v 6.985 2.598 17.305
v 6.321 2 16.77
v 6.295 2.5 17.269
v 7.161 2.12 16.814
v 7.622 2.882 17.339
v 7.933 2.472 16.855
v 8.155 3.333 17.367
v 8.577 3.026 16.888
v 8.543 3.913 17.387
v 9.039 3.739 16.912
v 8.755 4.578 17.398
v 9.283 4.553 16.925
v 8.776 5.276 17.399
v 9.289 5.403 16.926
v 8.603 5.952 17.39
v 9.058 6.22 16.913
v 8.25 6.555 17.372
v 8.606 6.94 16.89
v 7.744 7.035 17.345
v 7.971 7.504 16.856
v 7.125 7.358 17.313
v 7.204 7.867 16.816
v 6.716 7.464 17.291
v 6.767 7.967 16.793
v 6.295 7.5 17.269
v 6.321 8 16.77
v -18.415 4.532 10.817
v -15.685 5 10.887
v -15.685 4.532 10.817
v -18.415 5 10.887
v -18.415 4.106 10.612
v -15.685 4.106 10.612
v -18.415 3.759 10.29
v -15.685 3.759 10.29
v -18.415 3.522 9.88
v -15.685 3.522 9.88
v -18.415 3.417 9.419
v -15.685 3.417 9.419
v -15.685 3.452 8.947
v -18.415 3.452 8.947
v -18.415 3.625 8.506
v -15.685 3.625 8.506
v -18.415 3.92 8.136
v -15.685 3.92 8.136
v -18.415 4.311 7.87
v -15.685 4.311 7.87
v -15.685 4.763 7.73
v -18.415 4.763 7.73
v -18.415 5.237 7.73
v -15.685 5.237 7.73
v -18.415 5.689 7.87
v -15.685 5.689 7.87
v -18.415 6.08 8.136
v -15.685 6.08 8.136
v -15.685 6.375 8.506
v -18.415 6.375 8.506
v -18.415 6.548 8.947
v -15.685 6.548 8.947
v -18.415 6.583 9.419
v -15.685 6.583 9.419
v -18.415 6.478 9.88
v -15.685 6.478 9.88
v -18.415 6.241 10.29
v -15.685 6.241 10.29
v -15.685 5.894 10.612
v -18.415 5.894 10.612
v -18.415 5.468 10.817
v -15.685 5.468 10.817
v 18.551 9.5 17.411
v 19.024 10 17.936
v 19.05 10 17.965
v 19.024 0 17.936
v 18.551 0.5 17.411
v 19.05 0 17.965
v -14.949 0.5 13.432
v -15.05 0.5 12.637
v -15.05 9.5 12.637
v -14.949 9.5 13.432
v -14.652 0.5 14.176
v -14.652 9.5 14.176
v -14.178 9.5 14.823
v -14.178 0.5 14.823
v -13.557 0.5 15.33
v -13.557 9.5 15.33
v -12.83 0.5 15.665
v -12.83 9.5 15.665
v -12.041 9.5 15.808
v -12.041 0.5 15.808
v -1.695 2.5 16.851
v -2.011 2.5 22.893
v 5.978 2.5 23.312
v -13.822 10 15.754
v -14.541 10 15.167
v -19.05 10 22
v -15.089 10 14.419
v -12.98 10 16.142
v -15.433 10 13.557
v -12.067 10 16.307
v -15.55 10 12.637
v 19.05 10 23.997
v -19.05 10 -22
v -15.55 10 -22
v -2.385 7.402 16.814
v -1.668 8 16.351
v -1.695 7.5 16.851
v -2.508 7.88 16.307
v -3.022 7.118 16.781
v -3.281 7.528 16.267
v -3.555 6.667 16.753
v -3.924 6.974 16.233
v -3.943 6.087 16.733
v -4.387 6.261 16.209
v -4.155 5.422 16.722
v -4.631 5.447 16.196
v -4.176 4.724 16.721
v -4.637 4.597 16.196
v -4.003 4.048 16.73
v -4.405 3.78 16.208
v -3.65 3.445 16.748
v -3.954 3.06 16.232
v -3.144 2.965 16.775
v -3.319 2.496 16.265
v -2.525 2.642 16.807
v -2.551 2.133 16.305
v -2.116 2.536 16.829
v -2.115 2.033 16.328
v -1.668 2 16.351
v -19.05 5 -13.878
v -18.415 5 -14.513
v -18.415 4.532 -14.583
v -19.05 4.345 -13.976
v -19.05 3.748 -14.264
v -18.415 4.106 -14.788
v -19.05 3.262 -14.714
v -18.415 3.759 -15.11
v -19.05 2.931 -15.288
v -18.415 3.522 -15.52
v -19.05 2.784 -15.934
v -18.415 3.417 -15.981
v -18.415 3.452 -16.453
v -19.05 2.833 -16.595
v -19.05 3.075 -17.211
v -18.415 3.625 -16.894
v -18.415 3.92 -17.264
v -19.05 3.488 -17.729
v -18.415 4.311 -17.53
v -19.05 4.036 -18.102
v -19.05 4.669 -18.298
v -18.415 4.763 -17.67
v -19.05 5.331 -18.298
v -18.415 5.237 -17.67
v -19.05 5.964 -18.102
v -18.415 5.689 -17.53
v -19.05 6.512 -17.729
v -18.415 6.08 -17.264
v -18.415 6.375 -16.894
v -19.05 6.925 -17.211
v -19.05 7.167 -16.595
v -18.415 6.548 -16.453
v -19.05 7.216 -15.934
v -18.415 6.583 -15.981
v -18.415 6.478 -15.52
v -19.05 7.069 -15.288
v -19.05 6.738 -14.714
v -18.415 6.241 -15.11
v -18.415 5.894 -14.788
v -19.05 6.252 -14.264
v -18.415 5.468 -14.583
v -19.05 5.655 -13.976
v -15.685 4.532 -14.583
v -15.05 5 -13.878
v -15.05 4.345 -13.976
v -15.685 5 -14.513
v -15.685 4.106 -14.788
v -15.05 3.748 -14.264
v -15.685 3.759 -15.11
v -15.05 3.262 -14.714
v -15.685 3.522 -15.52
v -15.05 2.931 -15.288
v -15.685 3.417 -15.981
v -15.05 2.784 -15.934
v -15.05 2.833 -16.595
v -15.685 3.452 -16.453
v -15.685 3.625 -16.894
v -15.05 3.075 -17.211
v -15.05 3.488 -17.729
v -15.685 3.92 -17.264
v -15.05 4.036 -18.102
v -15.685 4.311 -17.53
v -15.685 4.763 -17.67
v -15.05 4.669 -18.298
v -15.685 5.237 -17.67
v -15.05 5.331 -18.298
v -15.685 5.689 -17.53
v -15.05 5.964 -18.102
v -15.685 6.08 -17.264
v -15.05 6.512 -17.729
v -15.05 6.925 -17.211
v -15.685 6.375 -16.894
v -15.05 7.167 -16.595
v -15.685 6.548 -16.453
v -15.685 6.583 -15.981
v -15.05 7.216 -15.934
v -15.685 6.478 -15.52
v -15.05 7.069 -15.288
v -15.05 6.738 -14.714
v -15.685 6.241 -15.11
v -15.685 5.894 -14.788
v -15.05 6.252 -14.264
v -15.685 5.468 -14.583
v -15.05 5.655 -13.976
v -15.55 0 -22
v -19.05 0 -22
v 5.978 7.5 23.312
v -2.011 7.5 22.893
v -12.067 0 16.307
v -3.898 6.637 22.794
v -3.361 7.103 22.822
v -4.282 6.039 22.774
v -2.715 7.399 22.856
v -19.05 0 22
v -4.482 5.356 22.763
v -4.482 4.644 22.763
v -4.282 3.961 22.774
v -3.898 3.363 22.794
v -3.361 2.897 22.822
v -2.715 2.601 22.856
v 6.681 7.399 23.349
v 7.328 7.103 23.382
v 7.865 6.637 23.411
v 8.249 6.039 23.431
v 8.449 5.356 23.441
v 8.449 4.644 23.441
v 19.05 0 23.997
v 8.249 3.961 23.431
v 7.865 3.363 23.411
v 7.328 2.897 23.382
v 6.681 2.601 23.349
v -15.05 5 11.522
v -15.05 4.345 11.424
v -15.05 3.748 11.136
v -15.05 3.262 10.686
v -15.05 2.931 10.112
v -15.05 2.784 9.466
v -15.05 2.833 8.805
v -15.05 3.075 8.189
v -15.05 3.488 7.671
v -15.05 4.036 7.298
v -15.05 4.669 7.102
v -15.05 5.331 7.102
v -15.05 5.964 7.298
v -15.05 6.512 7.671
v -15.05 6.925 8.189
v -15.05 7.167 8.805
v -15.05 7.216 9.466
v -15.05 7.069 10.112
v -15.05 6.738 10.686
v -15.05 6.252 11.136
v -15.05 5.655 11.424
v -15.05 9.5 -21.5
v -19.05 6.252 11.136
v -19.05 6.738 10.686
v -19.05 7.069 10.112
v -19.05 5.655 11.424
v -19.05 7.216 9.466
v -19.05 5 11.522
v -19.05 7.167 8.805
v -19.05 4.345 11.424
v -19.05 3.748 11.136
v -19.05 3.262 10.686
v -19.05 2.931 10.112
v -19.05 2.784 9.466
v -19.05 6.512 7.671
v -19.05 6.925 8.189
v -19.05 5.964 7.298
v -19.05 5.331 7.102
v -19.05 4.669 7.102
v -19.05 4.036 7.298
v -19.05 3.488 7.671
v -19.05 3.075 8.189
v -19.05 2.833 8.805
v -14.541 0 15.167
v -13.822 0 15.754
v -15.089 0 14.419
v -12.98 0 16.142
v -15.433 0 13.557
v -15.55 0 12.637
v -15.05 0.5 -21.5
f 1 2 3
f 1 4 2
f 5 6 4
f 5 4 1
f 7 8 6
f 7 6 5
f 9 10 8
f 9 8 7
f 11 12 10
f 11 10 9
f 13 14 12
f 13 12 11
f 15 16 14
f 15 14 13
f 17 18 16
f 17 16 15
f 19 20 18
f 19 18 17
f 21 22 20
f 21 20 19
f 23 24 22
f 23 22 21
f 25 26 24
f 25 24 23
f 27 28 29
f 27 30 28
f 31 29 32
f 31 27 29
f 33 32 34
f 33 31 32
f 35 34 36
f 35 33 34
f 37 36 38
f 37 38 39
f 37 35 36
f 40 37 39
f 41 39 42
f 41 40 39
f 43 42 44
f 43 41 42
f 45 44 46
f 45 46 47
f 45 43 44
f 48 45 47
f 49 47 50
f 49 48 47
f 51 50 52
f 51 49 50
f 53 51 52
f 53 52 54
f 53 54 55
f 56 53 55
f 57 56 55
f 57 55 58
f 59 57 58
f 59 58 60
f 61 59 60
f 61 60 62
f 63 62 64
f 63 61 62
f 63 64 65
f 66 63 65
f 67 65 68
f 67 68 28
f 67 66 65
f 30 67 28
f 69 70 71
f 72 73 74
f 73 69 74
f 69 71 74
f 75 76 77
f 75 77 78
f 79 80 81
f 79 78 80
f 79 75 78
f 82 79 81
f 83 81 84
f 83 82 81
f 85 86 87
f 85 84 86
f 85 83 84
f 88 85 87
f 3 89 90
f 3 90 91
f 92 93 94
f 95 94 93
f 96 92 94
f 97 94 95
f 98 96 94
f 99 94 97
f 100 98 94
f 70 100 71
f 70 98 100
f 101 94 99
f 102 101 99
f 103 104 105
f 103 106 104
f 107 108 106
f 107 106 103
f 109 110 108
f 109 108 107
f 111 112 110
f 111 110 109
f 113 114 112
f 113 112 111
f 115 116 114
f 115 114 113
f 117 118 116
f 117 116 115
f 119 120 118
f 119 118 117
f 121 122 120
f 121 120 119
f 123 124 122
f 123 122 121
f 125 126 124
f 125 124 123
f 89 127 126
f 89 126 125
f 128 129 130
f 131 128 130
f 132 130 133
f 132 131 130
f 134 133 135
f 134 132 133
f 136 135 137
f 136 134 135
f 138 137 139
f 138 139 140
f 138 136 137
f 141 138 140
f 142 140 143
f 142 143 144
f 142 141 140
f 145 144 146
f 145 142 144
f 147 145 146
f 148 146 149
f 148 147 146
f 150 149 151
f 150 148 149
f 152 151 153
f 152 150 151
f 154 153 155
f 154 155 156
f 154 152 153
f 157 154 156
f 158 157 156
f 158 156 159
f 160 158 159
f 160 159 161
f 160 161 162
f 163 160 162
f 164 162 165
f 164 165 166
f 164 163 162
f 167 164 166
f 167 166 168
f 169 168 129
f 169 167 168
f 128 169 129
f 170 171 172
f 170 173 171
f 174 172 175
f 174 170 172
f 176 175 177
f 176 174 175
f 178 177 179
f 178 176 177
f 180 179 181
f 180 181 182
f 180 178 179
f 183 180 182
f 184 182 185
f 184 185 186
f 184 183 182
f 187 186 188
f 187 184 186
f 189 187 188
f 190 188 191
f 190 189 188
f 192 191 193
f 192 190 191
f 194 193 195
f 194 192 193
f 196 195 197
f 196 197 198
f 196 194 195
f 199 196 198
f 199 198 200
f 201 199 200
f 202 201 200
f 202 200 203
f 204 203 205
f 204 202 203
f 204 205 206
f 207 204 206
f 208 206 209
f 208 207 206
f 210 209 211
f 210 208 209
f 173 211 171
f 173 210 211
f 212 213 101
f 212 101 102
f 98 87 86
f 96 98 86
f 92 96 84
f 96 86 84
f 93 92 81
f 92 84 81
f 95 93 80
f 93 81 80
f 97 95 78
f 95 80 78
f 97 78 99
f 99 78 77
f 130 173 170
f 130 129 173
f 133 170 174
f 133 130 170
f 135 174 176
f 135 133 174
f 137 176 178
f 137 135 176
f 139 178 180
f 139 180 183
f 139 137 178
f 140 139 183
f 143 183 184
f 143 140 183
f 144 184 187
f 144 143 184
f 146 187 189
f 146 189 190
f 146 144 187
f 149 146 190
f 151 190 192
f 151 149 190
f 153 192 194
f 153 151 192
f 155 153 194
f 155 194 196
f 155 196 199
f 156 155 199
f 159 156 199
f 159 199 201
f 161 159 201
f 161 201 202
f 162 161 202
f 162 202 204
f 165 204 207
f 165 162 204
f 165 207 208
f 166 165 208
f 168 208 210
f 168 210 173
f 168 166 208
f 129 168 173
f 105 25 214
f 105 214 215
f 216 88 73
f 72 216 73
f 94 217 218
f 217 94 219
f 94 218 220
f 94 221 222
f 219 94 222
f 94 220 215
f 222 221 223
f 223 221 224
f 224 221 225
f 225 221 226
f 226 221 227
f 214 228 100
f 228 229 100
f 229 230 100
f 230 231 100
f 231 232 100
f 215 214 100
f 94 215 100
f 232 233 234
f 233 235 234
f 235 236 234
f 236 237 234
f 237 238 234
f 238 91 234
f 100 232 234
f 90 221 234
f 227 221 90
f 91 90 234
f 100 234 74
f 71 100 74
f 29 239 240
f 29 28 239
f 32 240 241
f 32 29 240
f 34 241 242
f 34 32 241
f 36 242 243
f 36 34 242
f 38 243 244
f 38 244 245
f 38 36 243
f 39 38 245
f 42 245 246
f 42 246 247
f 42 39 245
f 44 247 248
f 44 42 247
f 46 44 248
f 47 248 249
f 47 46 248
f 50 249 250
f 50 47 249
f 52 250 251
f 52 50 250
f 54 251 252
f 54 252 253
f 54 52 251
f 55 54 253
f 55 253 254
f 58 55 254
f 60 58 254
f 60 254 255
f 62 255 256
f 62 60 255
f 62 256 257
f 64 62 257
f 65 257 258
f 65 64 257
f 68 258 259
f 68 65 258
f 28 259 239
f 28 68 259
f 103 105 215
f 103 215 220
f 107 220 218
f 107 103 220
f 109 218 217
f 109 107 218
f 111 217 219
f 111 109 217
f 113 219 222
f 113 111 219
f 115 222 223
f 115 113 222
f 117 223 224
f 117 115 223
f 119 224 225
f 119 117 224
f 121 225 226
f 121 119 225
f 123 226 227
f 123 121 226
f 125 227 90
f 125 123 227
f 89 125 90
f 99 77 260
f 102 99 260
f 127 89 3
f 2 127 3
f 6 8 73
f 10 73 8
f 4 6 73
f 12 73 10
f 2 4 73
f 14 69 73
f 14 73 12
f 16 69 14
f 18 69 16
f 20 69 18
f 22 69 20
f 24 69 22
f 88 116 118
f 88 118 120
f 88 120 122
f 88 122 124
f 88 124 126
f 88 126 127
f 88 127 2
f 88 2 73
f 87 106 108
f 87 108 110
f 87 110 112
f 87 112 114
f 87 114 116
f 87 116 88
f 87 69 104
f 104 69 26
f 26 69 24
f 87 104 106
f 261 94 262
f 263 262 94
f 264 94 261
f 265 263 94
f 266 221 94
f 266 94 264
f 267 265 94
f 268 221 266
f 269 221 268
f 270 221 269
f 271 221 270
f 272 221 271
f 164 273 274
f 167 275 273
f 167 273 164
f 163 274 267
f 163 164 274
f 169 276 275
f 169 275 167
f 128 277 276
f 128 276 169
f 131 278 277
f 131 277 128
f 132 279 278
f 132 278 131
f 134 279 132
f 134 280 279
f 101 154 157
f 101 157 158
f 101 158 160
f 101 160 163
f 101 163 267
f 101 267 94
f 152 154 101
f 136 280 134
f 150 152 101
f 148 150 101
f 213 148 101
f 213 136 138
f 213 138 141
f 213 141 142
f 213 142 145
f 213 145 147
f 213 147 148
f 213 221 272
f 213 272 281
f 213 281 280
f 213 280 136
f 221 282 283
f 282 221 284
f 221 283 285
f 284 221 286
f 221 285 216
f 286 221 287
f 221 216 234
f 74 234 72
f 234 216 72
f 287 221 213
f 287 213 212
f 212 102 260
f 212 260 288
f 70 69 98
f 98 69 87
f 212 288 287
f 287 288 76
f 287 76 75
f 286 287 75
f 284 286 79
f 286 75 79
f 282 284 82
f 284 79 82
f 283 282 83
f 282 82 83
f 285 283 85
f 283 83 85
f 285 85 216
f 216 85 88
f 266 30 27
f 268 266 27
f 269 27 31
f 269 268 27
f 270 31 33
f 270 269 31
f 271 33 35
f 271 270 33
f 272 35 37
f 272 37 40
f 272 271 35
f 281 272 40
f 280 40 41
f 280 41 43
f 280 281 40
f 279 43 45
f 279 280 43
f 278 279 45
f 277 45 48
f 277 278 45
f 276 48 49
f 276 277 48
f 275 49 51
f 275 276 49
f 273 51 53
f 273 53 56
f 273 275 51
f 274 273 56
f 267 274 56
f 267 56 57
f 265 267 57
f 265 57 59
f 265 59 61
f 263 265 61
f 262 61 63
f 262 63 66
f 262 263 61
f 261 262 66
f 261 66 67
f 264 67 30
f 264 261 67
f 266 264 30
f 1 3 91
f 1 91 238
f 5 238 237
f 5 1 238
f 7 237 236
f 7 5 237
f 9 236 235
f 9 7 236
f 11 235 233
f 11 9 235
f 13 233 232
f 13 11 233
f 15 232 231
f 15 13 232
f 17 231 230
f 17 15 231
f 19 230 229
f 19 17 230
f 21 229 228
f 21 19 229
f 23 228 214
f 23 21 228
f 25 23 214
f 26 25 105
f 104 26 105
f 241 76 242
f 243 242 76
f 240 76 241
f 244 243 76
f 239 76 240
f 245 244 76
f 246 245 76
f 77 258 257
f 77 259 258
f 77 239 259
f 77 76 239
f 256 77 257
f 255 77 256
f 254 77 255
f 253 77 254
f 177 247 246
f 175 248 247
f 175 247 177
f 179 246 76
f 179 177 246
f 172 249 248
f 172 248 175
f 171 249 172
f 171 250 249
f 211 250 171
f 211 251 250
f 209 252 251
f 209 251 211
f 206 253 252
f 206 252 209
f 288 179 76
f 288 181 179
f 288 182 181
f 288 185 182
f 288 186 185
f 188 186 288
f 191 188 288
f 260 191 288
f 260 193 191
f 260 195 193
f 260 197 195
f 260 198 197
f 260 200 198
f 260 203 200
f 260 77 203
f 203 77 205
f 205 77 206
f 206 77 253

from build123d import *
from OCP.BRepFilletAPI import BRepFilletAPI_MakeChamfer

# Parameters (mm, degrees)
SKETCH1_W                             = 38.1
SKETCH1_H                             = 44
BOSS_EXTRUDE1_DEPTH                   = 10
CUT_EXTRUDE1_REACH                    = 32.772
SKETCH2_W                             = 34.1
SKETCH2_H                             = 37.65
F_1_8_0_125_DIAMETER_HOLE1_AT_2_COUNT = 2
F_1_8_0_125_DIAMETER_HOLE1_AT_2_PITCH = 25.4
DRAFT1_ANGLE                          = 3
CUT_EXTRUDE2_DEPTH                    = 33.229580472
CUT_EXTRUDE3_DEPTH                    = 45.389768844
FILLET2_R                             = 3.175
CHAMFER1_SIZE                         = 0.5
CHAMFER2_SIZE                         = 0.5
CHAMFER2_SIZE2                        = 0.528377251


with BuildPart() as part:
    # Sketch1 → Boss-Extrude1 (new body)
    with BuildSketch(Plane(origin=(0, 0, 0), x_dir=(1, 0, 0), z_dir=(0, 1, 0))):
        Rectangle(SKETCH1_W, SKETCH1_H)
    extrude(amount=BOSS_EXTRUDE1_DEPTH)

    # Sketch2 → Cut-Extrude1 (cut, up to next)
    with BuildSketch(Plane(origin=(0, 10, 0), x_dir=(1, 0, 0), z_dir=(0, 1, 0)), mode=Mode.PRIVATE) as cut_extrude1_sk1:
        with Locations((2, 3.175)):
            Rectangle(SKETCH2_W, SKETCH2_H)
    cut_extrude1_tool1 = extrude(cut_extrude1_sk1.sketch, amount=-CUT_EXTRUDE1_REACH, mode=Mode.PRIVATE) & part.part
    add(cut_extrude1_tool1.solids().sort_by_distance((2, 10, -3.175))[0], mode=Mode.SUBTRACT)

    # Sketch3 → 1/8 (0.125) Diameter Hole1 (revolve, cut)
    with BuildSketch(Plane(origin=(-19.05, 5, -16.1), x_dir=(0, 0, 1), z_dir=(0, 1, 0))):
        Polygon((0, 0), (0, 4), (2.2225, 4), (1.5875, 3.365), (1.5875, 0.635), (2.2225, 0), align=None)
    f_1_8_0_125_diameter_hole1 = revolve(axis=Axis((-25.4, 5, -16.1), (1, 0, 0)), mode=Mode.SUBTRACT)

    # 1/8 (0.125) Diameter Hole1 at 2: 1/8 (0.125) Diameter Hole1 ×2
    with Locations(*[(0, 0, i * F_1_8_0_125_DIAMETER_HOLE1_AT_2_PITCH) for i in range(1, F_1_8_0_125_DIAMETER_HOLE1_AT_2_COUNT)]):
        add(f_1_8_0_125_diameter_hole1, mode=Mode.SUBTRACT)

    # Draft1
    draft1_faces = [part.faces().sort_by_distance(p)[0] for p in [
        (0, 5, 22),
    ]]
    draft(draft1_faces, Plane(origin=(-19.05, 10, 22), x_dir=(0, 0, -1), z_dir=(-1, 0, 0)), DRAFT1_ANGLE)

    # Sketch7 → Cut-Extrude2 (cut, through all)
    with BuildSketch(Plane(origin=(0, 10, 0), x_dir=(1, 0, 0), z_dir=(0, 1, 0))):
        Polygon((-15.05, -15.65), (19.05, -15.65), (19.05, -17.437105274), align=None)
    extrude(amount=-CUT_EXTRUDE2_DEPTH, mode=Mode.SUBTRACT)

    # Sketch8 → Cut-Extrude3 (cut, through all)
    with BuildSketch(Plane(origin=(-0.859157962, 0, 16.393710517), x_dir=(-0.9986295347545739, 0, -0.05233595624294398), z_dir=(0.05233595624294399, 0, -0.998629534754574))):
        with BuildLine():
            Line((-7.189683217, 7.5), (0.810316783, 7.5))
            ThreePointArc((0.810316783, 7.5), (3.310316783, 5), (0.810316783, 2.5))
            Line((0.810316783, 2.5), (-7.189683217, 2.5))
            ThreePointArc((-7.189683217, 2.5), (-9.689683217, 5), (-7.189683217, 7.5))
        make_face()
    extrude(amount=-CUT_EXTRUDE3_DEPTH, mode=Mode.SUBTRACT)

    # Fillet2
    fillet2_edges = [part.edges().sort_by_distance(p)[0] for p in [
        (-15.05, 5, 15.65),
    ]]
    fillet(fillet2_edges, radius=FILLET2_R)

    # Chamfer1
    chamfer1_edges = [part.edges().sort_by_distance(p)[0] for p in [
        (8.817245881, 5, 16.900829354),
        (2.326153905, 2.5, 16.560645639),
        (-4.164938071, 5, 16.220461923),
        (2.326153905, 7.5, 16.560645639),
    ]]
    chamfer(chamfer1_edges, length=CHAMFER1_SIZE)

    # Chamfer2: one chamfer whose edges measure the first distance from different faces: ONE call of the kernel's chamfer builder (chamfer() names one face for all edges)
    chamfer2_edges_1 = [part.edges().sort_by_distance(p)[0] for p in [
        (-15.05, 0, -4.68148125),
        (-15.05, 5, -22),
        (-15.05, 10, -4.68148125),
        (3.504416669, 10, 16.622395774),
        (3.504416669, 0, 16.622395774),
        (-14.178063628, 10, 14.822563279),
        (-14.178063628, 0, 14.822563279),
    ]]
    chamfer2_edges_2 = [part.edges().sort_by_distance(p)[0] for p in [
        (19.05, 5, 17.437105274),
    ]]
    chamfer2_side_2 = [part.faces().sort_by_distance(p)[0] for p in [
        (9.643116423, 5, 16.944111395),
    ]]
    chamfer2 = BRepFilletAPI_MakeChamfer(part.part.solid().wrapped)
    for e in chamfer2_edges_1:
        chamfer2.Add(CHAMFER2_SIZE, e.wrapped)
    for e in chamfer2_edges_2:
        chamfer2.Add(CHAMFER2_SIZE, CHAMFER2_SIZE2, e.wrapped, chamfer2_side_2[0].wrapped)  # the first distance lies on this face
    add(Compound.cast(chamfer2.Shape()), mode=Mode.REPLACE)


solid = part.part
